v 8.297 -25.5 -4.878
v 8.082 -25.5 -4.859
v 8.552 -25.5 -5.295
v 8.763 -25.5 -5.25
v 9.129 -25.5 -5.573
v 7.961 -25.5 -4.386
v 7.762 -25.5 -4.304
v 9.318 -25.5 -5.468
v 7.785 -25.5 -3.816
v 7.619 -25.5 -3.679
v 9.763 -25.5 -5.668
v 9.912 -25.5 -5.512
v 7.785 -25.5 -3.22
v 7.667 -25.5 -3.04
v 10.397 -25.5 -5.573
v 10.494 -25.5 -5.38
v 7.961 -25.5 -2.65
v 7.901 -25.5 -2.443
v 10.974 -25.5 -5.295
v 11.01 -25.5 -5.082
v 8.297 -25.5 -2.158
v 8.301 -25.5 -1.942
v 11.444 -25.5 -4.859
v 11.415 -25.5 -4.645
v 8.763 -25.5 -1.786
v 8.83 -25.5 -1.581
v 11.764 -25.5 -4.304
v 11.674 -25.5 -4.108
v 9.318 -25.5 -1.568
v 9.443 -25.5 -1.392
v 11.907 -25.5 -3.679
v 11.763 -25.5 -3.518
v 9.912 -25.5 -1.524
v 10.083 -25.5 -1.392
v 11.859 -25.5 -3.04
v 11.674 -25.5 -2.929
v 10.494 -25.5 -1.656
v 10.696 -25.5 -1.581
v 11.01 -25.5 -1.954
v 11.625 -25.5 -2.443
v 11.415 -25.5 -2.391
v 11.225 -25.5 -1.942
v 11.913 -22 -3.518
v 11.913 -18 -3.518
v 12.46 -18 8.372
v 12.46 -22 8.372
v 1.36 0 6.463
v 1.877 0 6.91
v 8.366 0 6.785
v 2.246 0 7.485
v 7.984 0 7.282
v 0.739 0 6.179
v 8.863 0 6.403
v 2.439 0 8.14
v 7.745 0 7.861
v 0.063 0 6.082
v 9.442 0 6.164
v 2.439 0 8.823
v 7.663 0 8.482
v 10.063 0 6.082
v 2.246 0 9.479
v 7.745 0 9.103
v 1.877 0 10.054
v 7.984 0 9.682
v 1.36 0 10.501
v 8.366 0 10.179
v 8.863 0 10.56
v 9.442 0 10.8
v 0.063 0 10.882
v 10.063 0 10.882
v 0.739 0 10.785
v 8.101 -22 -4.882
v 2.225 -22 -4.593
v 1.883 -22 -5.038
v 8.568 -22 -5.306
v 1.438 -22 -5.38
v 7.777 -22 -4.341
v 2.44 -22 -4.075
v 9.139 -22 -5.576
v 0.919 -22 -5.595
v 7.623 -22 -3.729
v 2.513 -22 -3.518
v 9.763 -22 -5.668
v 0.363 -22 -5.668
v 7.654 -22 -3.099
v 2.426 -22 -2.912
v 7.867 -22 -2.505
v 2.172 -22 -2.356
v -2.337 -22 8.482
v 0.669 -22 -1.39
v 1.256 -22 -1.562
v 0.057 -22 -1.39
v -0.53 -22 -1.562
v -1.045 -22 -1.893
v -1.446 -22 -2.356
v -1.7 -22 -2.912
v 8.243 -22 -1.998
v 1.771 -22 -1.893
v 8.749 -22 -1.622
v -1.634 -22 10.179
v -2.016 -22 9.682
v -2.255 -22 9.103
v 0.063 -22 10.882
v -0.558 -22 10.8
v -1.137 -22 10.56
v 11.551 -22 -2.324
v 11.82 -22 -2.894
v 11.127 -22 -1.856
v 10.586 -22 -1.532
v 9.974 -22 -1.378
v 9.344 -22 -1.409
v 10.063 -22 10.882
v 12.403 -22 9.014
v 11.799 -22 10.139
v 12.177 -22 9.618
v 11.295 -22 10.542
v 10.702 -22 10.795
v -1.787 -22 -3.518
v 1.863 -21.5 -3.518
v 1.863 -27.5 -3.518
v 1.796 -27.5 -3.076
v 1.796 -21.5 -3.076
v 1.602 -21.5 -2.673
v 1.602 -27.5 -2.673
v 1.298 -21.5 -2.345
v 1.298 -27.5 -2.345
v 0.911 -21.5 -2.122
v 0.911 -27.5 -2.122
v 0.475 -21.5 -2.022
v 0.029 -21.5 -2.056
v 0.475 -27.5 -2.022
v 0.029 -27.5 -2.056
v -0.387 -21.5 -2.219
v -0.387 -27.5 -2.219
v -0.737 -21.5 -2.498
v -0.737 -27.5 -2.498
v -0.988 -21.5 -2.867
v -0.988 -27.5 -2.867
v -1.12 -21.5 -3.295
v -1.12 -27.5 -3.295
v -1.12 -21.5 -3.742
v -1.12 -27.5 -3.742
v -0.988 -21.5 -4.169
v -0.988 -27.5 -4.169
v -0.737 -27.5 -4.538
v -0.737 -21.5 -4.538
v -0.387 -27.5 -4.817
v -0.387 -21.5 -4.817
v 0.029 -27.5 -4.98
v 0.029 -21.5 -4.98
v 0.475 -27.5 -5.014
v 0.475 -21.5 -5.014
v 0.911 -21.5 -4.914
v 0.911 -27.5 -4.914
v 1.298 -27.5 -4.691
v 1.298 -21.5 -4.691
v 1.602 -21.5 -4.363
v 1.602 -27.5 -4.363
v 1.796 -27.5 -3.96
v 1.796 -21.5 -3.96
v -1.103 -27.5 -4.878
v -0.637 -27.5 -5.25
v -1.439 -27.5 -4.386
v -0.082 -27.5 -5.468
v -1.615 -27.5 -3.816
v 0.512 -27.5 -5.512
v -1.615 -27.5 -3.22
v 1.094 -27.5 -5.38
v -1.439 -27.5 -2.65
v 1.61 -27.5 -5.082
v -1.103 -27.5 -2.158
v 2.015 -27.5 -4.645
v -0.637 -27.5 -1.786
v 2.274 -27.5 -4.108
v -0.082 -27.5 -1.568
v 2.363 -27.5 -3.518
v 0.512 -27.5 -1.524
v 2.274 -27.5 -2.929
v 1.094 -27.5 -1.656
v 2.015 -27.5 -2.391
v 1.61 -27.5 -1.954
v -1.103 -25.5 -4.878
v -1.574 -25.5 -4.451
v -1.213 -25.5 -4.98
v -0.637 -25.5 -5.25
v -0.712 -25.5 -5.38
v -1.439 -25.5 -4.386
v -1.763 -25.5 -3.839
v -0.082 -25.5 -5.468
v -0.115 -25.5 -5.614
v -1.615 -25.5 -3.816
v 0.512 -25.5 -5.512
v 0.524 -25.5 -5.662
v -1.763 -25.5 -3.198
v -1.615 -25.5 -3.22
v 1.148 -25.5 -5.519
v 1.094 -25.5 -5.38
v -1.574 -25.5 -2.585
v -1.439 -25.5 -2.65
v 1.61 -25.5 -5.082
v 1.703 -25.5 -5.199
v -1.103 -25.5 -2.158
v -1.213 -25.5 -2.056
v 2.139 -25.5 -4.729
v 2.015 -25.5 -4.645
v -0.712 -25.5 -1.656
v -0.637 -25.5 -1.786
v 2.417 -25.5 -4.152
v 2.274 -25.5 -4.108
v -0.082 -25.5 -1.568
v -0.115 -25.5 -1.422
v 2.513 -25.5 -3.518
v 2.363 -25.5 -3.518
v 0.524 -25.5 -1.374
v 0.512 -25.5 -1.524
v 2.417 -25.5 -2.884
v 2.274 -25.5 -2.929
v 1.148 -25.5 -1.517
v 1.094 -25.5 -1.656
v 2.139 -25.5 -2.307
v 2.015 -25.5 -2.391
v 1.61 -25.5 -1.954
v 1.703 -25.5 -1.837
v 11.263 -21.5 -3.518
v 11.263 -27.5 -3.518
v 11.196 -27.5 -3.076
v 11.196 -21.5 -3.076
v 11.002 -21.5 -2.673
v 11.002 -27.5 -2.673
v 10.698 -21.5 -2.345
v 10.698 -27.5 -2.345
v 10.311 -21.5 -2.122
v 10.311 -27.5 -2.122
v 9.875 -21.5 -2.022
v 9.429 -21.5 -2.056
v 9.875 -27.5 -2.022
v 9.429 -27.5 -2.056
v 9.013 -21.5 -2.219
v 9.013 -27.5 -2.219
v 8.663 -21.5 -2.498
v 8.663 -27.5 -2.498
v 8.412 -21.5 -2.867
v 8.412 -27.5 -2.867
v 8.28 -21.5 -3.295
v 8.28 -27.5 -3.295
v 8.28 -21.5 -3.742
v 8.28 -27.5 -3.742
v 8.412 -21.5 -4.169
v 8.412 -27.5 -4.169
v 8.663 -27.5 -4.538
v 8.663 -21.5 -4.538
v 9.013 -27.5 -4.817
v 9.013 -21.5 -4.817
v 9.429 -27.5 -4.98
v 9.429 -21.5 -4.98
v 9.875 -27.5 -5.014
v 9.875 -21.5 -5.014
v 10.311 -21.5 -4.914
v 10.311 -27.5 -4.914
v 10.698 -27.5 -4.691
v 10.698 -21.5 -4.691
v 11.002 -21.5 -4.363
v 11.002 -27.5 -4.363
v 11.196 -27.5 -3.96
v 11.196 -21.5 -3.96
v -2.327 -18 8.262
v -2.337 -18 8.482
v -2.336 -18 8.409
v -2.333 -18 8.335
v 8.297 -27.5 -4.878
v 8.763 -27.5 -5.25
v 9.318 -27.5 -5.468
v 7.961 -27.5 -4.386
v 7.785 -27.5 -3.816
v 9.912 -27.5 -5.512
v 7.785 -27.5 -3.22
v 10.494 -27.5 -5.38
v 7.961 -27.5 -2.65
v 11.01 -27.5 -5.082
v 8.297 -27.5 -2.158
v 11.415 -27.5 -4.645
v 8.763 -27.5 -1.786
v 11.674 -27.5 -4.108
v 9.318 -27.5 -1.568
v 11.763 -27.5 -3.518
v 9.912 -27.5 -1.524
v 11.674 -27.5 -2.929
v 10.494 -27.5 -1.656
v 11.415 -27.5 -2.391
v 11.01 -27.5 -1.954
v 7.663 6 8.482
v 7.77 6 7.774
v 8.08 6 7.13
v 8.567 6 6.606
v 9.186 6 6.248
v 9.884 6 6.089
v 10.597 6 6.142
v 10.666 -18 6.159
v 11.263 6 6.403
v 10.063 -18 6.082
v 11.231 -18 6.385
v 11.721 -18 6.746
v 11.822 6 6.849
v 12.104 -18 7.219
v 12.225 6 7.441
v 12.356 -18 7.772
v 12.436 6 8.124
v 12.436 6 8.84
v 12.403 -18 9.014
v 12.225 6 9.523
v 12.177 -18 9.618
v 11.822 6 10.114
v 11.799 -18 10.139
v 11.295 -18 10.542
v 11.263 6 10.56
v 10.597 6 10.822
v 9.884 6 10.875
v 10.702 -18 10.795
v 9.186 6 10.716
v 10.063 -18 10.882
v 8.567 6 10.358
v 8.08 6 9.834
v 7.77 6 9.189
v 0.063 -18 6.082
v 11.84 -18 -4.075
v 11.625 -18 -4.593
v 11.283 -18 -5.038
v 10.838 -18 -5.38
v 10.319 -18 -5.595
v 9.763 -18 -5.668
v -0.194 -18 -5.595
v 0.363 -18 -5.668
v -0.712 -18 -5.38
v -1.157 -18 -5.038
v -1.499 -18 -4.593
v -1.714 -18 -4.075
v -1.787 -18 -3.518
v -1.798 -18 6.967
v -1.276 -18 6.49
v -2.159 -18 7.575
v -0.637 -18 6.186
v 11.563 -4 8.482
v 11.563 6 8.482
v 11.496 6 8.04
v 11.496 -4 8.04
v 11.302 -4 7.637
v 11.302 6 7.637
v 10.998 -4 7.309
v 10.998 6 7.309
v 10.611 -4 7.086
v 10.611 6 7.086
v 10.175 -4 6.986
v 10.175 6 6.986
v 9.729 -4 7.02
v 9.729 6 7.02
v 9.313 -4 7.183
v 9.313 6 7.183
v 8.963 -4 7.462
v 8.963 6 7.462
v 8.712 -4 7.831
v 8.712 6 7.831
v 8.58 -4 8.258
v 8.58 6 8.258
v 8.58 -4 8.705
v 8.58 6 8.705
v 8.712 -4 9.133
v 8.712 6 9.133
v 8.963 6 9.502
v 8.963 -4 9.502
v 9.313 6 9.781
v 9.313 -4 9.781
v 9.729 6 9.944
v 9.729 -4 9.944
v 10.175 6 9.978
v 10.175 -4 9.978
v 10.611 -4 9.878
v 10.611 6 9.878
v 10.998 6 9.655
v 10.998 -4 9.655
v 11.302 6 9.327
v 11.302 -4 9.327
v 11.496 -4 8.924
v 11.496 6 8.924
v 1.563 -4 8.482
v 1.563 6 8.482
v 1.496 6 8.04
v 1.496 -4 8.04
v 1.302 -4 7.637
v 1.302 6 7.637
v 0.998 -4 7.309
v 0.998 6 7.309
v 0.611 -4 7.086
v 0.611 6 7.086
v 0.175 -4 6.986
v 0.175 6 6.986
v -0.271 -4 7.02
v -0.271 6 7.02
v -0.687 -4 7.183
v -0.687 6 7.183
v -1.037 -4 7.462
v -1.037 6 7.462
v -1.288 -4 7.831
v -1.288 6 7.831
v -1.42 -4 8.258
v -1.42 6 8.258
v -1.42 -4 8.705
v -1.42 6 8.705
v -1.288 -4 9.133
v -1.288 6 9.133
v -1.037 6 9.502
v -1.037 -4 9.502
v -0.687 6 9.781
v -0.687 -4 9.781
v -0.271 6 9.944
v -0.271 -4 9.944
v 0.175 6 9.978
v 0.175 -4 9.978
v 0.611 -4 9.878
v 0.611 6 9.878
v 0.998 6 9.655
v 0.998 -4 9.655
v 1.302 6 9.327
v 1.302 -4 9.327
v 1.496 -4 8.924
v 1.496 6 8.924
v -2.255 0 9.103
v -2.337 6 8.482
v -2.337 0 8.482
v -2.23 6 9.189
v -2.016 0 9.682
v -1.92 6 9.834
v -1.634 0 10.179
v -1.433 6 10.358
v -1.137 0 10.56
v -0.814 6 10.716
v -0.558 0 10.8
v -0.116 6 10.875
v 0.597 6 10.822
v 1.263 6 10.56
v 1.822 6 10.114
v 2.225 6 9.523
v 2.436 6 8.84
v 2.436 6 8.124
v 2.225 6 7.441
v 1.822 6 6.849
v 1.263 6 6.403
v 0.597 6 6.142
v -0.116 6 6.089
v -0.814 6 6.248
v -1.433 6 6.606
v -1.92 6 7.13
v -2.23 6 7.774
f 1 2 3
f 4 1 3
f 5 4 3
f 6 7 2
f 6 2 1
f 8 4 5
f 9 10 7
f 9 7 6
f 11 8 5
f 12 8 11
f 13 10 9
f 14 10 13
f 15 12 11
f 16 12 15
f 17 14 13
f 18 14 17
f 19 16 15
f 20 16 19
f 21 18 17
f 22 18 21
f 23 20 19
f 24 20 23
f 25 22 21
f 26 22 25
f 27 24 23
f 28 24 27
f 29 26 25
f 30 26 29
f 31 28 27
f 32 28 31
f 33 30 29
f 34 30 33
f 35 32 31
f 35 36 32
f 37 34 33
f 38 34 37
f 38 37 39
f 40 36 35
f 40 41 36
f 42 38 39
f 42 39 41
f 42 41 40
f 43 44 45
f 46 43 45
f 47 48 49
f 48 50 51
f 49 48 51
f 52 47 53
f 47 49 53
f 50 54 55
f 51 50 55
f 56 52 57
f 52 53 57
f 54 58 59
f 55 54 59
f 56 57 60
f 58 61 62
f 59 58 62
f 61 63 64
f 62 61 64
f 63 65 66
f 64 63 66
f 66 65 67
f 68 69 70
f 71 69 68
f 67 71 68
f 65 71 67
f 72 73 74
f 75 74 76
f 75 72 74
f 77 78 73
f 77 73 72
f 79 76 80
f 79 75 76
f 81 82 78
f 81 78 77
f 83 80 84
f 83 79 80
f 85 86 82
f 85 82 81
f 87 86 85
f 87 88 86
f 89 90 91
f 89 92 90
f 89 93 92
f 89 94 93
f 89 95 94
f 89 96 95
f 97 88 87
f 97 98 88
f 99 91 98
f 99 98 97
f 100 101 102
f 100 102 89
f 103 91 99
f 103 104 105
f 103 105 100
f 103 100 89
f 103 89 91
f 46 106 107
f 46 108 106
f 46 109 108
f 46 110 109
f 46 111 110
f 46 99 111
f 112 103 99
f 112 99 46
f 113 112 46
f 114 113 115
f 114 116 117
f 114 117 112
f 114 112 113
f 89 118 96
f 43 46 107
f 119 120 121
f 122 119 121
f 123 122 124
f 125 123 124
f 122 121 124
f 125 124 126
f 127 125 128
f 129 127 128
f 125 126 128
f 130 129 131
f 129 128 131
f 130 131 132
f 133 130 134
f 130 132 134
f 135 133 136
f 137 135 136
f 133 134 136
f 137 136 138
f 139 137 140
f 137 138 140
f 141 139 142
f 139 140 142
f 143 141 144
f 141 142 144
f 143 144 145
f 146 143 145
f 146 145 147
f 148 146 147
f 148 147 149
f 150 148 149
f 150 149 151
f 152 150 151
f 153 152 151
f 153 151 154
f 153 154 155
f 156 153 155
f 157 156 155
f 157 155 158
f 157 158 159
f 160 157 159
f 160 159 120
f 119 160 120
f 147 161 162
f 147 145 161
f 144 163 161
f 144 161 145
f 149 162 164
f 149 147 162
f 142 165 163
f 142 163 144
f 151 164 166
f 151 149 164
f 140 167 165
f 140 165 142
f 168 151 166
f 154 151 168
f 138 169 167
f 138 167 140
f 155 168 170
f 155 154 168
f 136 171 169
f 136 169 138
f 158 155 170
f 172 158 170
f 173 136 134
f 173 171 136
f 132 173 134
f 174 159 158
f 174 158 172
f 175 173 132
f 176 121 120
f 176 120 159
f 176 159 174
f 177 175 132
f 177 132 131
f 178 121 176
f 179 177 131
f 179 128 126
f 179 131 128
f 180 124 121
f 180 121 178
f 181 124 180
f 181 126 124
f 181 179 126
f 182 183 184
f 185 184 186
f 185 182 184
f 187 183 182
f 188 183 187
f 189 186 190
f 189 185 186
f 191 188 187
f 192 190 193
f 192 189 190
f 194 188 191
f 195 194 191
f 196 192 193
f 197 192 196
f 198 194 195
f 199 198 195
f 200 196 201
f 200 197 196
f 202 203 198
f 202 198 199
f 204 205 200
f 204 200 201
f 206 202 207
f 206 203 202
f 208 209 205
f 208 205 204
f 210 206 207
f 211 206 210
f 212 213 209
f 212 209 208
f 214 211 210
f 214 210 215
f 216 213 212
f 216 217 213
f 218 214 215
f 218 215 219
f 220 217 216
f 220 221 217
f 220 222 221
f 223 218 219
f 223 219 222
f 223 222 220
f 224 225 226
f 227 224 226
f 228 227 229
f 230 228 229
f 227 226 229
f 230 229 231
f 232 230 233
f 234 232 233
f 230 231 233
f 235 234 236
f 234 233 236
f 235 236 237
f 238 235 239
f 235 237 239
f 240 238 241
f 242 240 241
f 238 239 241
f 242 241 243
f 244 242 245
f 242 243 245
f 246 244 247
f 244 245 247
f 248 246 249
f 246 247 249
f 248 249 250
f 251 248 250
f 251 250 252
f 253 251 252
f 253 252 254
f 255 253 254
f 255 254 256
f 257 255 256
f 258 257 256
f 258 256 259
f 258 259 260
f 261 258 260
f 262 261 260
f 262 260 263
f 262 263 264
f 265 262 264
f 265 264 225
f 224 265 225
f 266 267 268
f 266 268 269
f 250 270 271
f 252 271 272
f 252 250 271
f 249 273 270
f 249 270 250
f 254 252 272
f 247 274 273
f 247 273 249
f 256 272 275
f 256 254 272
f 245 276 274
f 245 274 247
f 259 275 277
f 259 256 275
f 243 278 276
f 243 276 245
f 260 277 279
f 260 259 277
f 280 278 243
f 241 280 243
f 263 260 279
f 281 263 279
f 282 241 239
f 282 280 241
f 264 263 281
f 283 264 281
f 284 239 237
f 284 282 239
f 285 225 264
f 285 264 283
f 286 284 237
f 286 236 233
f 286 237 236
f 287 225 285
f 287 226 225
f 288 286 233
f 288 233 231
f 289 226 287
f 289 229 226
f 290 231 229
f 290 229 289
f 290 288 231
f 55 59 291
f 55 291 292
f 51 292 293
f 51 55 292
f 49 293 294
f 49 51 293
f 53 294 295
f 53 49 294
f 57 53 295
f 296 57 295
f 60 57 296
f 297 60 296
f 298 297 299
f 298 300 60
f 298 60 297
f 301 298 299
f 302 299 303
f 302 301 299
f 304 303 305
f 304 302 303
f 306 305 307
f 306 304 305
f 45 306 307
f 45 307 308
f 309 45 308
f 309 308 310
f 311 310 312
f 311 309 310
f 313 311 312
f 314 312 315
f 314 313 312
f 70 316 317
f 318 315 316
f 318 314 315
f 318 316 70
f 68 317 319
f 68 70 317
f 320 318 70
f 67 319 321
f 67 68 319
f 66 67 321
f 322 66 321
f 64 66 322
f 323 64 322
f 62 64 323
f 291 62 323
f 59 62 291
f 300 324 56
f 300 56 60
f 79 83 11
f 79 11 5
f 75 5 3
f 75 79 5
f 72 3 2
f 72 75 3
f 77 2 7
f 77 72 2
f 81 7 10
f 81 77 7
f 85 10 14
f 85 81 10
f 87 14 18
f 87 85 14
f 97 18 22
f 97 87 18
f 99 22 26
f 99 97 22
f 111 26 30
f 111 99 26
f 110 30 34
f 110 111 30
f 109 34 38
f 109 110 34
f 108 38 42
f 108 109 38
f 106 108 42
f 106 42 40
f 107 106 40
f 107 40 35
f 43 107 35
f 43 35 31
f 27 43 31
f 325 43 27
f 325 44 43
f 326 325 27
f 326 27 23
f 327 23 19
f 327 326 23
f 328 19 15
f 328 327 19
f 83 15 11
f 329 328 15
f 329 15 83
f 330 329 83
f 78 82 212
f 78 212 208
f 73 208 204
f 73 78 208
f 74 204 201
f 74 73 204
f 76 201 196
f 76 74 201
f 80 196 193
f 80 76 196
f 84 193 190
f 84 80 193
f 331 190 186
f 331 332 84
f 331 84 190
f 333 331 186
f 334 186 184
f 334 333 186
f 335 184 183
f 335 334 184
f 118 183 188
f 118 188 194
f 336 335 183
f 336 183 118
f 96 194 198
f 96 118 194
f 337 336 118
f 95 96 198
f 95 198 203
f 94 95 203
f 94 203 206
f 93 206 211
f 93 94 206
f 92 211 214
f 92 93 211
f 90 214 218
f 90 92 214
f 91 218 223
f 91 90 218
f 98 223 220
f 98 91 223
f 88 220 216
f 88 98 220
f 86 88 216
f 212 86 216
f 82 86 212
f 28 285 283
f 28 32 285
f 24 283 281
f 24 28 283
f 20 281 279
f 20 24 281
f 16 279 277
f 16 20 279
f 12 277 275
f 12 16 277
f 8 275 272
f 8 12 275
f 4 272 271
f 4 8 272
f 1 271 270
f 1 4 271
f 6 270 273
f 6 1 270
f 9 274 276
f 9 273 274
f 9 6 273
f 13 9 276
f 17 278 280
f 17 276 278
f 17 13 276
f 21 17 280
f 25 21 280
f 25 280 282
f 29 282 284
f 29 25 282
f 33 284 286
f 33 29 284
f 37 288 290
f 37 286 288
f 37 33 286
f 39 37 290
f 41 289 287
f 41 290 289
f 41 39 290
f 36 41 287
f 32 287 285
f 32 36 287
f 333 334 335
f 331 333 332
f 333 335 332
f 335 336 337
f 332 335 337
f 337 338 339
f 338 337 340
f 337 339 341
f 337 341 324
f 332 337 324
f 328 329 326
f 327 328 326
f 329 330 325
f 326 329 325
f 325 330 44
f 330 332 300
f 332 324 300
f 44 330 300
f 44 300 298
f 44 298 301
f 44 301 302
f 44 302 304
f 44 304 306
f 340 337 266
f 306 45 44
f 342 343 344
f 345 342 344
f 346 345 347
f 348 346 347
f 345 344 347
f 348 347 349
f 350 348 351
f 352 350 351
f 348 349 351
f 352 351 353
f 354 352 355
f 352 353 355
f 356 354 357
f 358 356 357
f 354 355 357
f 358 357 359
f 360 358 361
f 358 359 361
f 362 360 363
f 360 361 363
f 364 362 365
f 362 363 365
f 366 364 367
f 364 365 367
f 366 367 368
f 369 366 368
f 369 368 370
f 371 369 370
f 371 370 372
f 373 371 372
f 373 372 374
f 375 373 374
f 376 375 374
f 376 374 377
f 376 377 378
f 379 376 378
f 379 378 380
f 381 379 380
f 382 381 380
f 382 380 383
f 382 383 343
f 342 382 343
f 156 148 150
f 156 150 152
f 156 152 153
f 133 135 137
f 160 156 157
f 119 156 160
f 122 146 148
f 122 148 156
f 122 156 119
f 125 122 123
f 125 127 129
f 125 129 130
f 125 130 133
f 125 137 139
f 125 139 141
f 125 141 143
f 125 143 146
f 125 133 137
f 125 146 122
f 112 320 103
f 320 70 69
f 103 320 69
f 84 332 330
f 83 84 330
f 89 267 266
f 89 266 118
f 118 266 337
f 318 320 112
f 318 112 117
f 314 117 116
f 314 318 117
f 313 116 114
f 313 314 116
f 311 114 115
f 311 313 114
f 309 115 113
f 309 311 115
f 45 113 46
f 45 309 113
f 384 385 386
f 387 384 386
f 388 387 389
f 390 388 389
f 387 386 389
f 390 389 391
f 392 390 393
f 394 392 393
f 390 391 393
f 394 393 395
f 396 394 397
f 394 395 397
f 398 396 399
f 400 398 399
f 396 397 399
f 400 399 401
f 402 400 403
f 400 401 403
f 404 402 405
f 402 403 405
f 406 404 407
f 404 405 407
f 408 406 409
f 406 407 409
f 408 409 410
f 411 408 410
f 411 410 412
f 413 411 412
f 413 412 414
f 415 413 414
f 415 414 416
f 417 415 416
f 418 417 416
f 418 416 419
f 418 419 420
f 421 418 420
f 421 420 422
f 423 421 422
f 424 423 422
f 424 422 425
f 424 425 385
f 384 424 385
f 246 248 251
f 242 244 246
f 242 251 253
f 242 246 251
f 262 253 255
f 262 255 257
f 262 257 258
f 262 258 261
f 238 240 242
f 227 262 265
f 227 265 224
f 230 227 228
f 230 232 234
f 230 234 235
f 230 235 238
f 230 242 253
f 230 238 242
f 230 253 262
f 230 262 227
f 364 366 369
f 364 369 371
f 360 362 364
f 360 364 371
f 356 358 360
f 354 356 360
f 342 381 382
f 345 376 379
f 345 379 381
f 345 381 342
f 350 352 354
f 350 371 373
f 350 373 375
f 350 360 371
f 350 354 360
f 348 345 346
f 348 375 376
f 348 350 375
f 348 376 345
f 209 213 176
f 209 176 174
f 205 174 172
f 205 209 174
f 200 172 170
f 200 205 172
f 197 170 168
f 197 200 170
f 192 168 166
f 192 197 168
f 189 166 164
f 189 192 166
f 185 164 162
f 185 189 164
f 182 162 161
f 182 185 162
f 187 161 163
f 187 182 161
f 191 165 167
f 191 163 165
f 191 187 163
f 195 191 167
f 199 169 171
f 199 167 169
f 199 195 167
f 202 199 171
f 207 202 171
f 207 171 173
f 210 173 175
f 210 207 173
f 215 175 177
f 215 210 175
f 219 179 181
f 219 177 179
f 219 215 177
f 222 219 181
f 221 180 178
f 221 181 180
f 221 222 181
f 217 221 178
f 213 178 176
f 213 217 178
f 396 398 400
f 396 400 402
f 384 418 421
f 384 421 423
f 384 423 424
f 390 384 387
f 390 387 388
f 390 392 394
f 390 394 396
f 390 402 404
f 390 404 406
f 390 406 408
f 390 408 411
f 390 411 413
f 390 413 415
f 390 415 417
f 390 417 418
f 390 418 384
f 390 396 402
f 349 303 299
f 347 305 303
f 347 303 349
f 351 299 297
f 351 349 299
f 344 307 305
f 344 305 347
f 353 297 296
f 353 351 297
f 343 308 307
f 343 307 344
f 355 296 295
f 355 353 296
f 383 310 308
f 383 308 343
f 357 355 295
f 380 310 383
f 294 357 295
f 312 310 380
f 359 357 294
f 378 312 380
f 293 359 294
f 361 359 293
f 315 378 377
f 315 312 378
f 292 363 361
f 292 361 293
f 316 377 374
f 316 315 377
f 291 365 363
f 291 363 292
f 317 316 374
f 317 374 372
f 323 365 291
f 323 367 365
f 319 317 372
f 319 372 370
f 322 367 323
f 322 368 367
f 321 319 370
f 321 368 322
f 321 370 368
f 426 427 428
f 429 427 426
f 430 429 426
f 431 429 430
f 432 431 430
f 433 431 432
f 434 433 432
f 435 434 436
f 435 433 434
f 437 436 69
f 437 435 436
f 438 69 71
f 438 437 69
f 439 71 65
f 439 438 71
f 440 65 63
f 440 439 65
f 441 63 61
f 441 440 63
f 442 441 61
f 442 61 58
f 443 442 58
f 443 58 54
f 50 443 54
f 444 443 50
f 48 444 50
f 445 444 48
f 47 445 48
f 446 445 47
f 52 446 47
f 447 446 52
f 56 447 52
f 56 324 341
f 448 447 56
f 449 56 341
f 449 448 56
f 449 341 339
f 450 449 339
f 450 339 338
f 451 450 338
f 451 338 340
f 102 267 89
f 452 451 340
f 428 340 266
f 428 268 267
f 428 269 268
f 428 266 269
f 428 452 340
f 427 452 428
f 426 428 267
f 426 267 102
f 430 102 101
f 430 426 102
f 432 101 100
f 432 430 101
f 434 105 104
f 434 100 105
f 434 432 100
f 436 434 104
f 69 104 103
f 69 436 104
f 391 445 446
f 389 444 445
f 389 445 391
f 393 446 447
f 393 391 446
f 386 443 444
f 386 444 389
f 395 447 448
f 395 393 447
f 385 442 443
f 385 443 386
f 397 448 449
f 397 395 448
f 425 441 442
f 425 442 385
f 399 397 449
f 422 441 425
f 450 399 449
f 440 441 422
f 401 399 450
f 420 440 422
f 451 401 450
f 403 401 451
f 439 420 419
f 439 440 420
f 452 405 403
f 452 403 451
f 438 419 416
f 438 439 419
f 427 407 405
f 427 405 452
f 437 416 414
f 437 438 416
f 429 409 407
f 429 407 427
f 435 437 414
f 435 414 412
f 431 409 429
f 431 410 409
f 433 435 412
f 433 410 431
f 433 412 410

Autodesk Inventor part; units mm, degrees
ref_plane "YZ Plane" through (0, 0, 0) normal (1, 0, 0) x (0, 1, 0)
ref_plane "XZ Plane" through (0, 0, 0) normal (0, 1, 0) x (-1, 0, 0)
ref_plane "XY Plane" through (0, 0, 0) normal (0, 0, 1) x (1, 0, 0)
sketch "Sketch1" plane through (0, 0, 0) normal (0, 1, 0) x (-1, 0, 0)
  circle A0 centre (-0.062958, 8.481909) radius 2.4
  circle A1 centre (-0.362958, -3.518091) radius 2.15
  circle A2 centre (-10.062958, 8.481909) radius 2.4
  circle A3 centre (-9.762958, -3.518091) radius 2.15
  point P0 (0, 0)
  dimension "d0" = 4.8
  dimension "d1" = 4.3
  dimension "d3" = 4.8
  dimension "d5" = 4.3
  dimension "d24" = 10
  dimension "d25" = 0.3
  dimension "d26" = 0.3
extrude "Extrusion1" add sketch "Sketch1" along normal blind 6 contours A0 | A2
sketch "Sketch2" plane through (0.062958, 0, 8.481909) normal (0, -1, 0) x (1, 0, 0)
  circle A0 centre (0.3, -12) radius 2.15
  circle A1 centre (9.7, -12) radius 2.15
  circle A2 centre (10, 0) radius 2.4
  circle A3 centre (0, 0) radius 2.4
  line L0 (-2.4, 0) -> (-1.85, -12)
  line L1 (0.3, -14.15) -> (9.7, -14.15)
  line L2 (11.85, -12) -> (12.39746, -0.110392)
  line L3 (0, 2.4) -> (10, 2.4)
  point P0 (-0.062958, -8.481909)
sketch "Sketch3" plane through (0.062958, 0, 8.481909) normal (0, -1, 0) x (1, 0, 0)
  circle A0 centre (10, 0) radius 2.4
  circle A1 centre (0, 0) radius 2.4
  line L0 (0, -2.4) -> (10, -2.4)
  line L1 (0, -2.4) -> (10, -2.4)
  circle A2 centre (0, 0) radius 2.4
  circle A3 centre (10, 0) radius 2.4
  circle A4 centre (10, 0) radius 2.4
  circle A5 centre (0, 0) radius 2.4
  circle A6 centre (0, 0) radius 2.4
  circle A7 centre (0, 0) radius 2.4
  circle A8 centre (0, 0) radius 2.4
  circle A9 centre (10, 0) radius 2.4
  circle A10 centre (10, 0) radius 2.4
  circle A11 centre (10, 0) radius 2.4
  circle A12 centre (10, 0) radius 2.4
  circle A13 centre (0, 0) radius 2.4
  circle A14 centre (10, 0) radius 2.4
  circle A15 centre (10, 0) radius 2.4
  circle A16 centre (0, 0) radius 2.4
  line L2 (0, 2.4) -> (10, 2.4)
  point P0 (-0.062958, -8.481909)
  point P1 (-2.4, 0)
  point P2 (12.39746, -0.110392)
extrude "Extrusion2" add sketch "Sketch3" along normal blind 18
sketch "Sketch4" plane through (0.062958, -18, 8.481909) normal (0, -1, 0) x (1, 0, 0)
  circle A0 centre (0.3, -12) radius 2.15
  circle A1 centre (9.7, -12) radius 2.15
  circle A2 centre (0, 0) radius 2.4
  circle A3 centre (10, 0) radius 2.4
  arc A4 (0, -2.4) -> (0, 2.4) centre (0, 0) ccw
  arc A5 (10, 2.4) -> (10, -2.4) centre (10, 0) ccw
  arc A6 (0, 2.4) -> (0, -2.4) centre (0, 0) ccw
  arc A7 (10, -2.4) -> (10, 2.4) centre (10, 0) ccw
  line L0 (0, -2.4) -> (10, -2.4)
  line L1 (0, -2.4) -> (10, -2.4)
  line L2 (10, 2.4) -> (0, 2.4)
  line L3 (10, 2.4) -> (0, 2.4)
  circle A8 centre (0, 0) radius 2.4
  arc A9 (0, -2.4) -> (0, 2.4) centre (0, 0) ccw
  arc A10 (0, 2.4) -> (0, -2.4) centre (0, 0) ccw
  circle A11 centre (10, 0) radius 2.4
  arc A12 (10, 2.4) -> (10, -2.4) centre (10, 0) ccw
  arc A13 (10, -2.4) -> (10, 2.4) centre (10, 0) ccw
  arc A14 (10, 2.4) -> (10, -2.4) centre (10, 0) ccw
  line L4 (0, -2.4) -> (10, -2.4)
  arc A15 (0, -2.4) -> (0, 2.4) centre (0, 0) ccw
  line L5 (10, 2.4) -> (0, 2.4)
  line L6 (0, -2.4) -> (10, -2.4)
  arc A16 (10, -2.4) -> (10, 2.4) centre (10, 0) ccw
  line L7 (10, 2.4) -> (0, 2.4)
  arc A17 (0, 2.4) -> (0, -2.4) centre (0, 0) ccw
  line L8 (0, -2.4) -> (10, -2.4)
  line L9 (0, -2.4) -> (10, -2.4)
  line L10 (10, 2.4) -> (0, 2.4)
  line L11 (10, 2.4) -> (0, 2.4)
  circle A18 centre (0, 0) radius 2.4
  circle A19 centre (10, 0) radius 2.4
  circle A20 centre (0, 0) radius 2.4
  circle A21 centre (10, 0) radius 2.4
  circle A22 centre (0.3, -12) radius 2.15
  circle A23 centre (9.7, -12) radius 2.15
  circle A24 centre (10, 0) radius 2.4
  circle A25 centre (0, 0) radius 2.4
  line L12 (-2.4, 0) -> (-1.85, -12)
  line L13 (0.3, -14.15) -> (9.7, -14.15)
  line L14 (11.85, -12) -> (12.39746, -0.110392)
  line L15 (0, 2.4) -> (10, 2.4)
  point P0 (-0.062958, -8.481909)
  point P1 (-0.062958, -8.481909)
  point P2 (-0.062958, -8.481909)
sketch "Sketch4 outline for Extrusion3" plane through (0.062958, -18, 8.481909) normal (0, -1, 0) x (1, 0, 0)
  line L0 (-2.4, 0) -> (-1.85, -12)
  arc A0 (0, 2.4) -> (-2.4, 0) centre (0, 0) ccw
  line L1 (10, 2.4) -> (0, 2.4)
  arc A1 (12.39746, -0.110392) -> (10, 2.4) centre (10, 0) ccw
  line L2 (11.85, -12) -> (12.39746, -0.110392)
  arc A2 (9.7, -14.15) -> (11.85, -12) centre (9.7, -12) ccw
  line L3 (0.3, -14.15) -> (9.7, -14.15)
  arc A3 (-1.85, -12) -> (0.3, -14.15) centre (0.3, -12) ccw
extrude "Extrusion3" add sketch "Sketch4 outline for Extrusion3" along normal blind 4
sketch "Sketch5" plane through (0.062958, -22, 8.481909) normal (0, -1, 0) x (1, 0, 0)
  arc A0 (-1.85, -12) -> (0.3, -14.15) centre (0.3, -12) ccw projected
  circle A1 centre (0.3, -12) radius 2.15
  arc A2 (9.7, -14.15) -> (11.85, -12) centre (9.7, -12) ccw projected
  circle A3 centre (9.7, -12) radius 2.15
  point P0 (-0.062958, -8.481909)
  point P1 (0.3, -14.15)
extrude "Extrusion4" add sketch "Sketch5" along normal blind 3.5
sketch "Sketch6" plane through (0.362958, -25.5, -3.518091) normal (0, -1, 0) x (1, 0, 0)
  arc A0 (0, -2.15) -> (-2.15, 0) centre (0, 0) ccw projected
  circle A1 centre (0, 0) radius 2
  arc A2 (11.55, 0) -> (9.4, -2.15) centre (9.4, 0) ccw projected
  circle A3 centre (9.4, 0) radius 2
  point P0 (-0.362958, 3.518091)
  dimension "d15" = 4
  dimension "d16" = 4
extrude "Extrusion5" add sketch "Sketch6" along normal blind 2
sketch "Sketch7" plane through (0.362958, -27.5, -3.518091) normal (0, -1, 0) x (1, 0, 0)
  circle A0 centre (0, 0) radius 1.5
  circle A1 centre (9.4, 0) radius 2 projected
  circle A2 centre (9.4, 0) radius 1.5
  point P0 (-0.362958, 3.518091)
  dimension "d19" = 3
  dimension "d20" = 3
extrude "Extrusion6" cut sketch "Sketch7" against normal blind 6 contours A0 | A2
sketch "Sketch8" plane through (0.062958, 6, 8.481909) normal (0, 1, 0) x (1, 0, 0)
  circle A0 centre (0, 0) radius 1.5
  circle A1 centre (10, 0) radius 2.4 projected
  circle A2 centre (10, 0) radius 1.5
  point P0 (-0.062958, 8.481909)
  dimension "d27" = 3
  dimension "d28" = 3
extrude "Extrusion7" cut sketch "Sketch8" against normal blind 10 contours A0 | A2
properties part number "gripper3rightsideservoholder_3DPrint"
